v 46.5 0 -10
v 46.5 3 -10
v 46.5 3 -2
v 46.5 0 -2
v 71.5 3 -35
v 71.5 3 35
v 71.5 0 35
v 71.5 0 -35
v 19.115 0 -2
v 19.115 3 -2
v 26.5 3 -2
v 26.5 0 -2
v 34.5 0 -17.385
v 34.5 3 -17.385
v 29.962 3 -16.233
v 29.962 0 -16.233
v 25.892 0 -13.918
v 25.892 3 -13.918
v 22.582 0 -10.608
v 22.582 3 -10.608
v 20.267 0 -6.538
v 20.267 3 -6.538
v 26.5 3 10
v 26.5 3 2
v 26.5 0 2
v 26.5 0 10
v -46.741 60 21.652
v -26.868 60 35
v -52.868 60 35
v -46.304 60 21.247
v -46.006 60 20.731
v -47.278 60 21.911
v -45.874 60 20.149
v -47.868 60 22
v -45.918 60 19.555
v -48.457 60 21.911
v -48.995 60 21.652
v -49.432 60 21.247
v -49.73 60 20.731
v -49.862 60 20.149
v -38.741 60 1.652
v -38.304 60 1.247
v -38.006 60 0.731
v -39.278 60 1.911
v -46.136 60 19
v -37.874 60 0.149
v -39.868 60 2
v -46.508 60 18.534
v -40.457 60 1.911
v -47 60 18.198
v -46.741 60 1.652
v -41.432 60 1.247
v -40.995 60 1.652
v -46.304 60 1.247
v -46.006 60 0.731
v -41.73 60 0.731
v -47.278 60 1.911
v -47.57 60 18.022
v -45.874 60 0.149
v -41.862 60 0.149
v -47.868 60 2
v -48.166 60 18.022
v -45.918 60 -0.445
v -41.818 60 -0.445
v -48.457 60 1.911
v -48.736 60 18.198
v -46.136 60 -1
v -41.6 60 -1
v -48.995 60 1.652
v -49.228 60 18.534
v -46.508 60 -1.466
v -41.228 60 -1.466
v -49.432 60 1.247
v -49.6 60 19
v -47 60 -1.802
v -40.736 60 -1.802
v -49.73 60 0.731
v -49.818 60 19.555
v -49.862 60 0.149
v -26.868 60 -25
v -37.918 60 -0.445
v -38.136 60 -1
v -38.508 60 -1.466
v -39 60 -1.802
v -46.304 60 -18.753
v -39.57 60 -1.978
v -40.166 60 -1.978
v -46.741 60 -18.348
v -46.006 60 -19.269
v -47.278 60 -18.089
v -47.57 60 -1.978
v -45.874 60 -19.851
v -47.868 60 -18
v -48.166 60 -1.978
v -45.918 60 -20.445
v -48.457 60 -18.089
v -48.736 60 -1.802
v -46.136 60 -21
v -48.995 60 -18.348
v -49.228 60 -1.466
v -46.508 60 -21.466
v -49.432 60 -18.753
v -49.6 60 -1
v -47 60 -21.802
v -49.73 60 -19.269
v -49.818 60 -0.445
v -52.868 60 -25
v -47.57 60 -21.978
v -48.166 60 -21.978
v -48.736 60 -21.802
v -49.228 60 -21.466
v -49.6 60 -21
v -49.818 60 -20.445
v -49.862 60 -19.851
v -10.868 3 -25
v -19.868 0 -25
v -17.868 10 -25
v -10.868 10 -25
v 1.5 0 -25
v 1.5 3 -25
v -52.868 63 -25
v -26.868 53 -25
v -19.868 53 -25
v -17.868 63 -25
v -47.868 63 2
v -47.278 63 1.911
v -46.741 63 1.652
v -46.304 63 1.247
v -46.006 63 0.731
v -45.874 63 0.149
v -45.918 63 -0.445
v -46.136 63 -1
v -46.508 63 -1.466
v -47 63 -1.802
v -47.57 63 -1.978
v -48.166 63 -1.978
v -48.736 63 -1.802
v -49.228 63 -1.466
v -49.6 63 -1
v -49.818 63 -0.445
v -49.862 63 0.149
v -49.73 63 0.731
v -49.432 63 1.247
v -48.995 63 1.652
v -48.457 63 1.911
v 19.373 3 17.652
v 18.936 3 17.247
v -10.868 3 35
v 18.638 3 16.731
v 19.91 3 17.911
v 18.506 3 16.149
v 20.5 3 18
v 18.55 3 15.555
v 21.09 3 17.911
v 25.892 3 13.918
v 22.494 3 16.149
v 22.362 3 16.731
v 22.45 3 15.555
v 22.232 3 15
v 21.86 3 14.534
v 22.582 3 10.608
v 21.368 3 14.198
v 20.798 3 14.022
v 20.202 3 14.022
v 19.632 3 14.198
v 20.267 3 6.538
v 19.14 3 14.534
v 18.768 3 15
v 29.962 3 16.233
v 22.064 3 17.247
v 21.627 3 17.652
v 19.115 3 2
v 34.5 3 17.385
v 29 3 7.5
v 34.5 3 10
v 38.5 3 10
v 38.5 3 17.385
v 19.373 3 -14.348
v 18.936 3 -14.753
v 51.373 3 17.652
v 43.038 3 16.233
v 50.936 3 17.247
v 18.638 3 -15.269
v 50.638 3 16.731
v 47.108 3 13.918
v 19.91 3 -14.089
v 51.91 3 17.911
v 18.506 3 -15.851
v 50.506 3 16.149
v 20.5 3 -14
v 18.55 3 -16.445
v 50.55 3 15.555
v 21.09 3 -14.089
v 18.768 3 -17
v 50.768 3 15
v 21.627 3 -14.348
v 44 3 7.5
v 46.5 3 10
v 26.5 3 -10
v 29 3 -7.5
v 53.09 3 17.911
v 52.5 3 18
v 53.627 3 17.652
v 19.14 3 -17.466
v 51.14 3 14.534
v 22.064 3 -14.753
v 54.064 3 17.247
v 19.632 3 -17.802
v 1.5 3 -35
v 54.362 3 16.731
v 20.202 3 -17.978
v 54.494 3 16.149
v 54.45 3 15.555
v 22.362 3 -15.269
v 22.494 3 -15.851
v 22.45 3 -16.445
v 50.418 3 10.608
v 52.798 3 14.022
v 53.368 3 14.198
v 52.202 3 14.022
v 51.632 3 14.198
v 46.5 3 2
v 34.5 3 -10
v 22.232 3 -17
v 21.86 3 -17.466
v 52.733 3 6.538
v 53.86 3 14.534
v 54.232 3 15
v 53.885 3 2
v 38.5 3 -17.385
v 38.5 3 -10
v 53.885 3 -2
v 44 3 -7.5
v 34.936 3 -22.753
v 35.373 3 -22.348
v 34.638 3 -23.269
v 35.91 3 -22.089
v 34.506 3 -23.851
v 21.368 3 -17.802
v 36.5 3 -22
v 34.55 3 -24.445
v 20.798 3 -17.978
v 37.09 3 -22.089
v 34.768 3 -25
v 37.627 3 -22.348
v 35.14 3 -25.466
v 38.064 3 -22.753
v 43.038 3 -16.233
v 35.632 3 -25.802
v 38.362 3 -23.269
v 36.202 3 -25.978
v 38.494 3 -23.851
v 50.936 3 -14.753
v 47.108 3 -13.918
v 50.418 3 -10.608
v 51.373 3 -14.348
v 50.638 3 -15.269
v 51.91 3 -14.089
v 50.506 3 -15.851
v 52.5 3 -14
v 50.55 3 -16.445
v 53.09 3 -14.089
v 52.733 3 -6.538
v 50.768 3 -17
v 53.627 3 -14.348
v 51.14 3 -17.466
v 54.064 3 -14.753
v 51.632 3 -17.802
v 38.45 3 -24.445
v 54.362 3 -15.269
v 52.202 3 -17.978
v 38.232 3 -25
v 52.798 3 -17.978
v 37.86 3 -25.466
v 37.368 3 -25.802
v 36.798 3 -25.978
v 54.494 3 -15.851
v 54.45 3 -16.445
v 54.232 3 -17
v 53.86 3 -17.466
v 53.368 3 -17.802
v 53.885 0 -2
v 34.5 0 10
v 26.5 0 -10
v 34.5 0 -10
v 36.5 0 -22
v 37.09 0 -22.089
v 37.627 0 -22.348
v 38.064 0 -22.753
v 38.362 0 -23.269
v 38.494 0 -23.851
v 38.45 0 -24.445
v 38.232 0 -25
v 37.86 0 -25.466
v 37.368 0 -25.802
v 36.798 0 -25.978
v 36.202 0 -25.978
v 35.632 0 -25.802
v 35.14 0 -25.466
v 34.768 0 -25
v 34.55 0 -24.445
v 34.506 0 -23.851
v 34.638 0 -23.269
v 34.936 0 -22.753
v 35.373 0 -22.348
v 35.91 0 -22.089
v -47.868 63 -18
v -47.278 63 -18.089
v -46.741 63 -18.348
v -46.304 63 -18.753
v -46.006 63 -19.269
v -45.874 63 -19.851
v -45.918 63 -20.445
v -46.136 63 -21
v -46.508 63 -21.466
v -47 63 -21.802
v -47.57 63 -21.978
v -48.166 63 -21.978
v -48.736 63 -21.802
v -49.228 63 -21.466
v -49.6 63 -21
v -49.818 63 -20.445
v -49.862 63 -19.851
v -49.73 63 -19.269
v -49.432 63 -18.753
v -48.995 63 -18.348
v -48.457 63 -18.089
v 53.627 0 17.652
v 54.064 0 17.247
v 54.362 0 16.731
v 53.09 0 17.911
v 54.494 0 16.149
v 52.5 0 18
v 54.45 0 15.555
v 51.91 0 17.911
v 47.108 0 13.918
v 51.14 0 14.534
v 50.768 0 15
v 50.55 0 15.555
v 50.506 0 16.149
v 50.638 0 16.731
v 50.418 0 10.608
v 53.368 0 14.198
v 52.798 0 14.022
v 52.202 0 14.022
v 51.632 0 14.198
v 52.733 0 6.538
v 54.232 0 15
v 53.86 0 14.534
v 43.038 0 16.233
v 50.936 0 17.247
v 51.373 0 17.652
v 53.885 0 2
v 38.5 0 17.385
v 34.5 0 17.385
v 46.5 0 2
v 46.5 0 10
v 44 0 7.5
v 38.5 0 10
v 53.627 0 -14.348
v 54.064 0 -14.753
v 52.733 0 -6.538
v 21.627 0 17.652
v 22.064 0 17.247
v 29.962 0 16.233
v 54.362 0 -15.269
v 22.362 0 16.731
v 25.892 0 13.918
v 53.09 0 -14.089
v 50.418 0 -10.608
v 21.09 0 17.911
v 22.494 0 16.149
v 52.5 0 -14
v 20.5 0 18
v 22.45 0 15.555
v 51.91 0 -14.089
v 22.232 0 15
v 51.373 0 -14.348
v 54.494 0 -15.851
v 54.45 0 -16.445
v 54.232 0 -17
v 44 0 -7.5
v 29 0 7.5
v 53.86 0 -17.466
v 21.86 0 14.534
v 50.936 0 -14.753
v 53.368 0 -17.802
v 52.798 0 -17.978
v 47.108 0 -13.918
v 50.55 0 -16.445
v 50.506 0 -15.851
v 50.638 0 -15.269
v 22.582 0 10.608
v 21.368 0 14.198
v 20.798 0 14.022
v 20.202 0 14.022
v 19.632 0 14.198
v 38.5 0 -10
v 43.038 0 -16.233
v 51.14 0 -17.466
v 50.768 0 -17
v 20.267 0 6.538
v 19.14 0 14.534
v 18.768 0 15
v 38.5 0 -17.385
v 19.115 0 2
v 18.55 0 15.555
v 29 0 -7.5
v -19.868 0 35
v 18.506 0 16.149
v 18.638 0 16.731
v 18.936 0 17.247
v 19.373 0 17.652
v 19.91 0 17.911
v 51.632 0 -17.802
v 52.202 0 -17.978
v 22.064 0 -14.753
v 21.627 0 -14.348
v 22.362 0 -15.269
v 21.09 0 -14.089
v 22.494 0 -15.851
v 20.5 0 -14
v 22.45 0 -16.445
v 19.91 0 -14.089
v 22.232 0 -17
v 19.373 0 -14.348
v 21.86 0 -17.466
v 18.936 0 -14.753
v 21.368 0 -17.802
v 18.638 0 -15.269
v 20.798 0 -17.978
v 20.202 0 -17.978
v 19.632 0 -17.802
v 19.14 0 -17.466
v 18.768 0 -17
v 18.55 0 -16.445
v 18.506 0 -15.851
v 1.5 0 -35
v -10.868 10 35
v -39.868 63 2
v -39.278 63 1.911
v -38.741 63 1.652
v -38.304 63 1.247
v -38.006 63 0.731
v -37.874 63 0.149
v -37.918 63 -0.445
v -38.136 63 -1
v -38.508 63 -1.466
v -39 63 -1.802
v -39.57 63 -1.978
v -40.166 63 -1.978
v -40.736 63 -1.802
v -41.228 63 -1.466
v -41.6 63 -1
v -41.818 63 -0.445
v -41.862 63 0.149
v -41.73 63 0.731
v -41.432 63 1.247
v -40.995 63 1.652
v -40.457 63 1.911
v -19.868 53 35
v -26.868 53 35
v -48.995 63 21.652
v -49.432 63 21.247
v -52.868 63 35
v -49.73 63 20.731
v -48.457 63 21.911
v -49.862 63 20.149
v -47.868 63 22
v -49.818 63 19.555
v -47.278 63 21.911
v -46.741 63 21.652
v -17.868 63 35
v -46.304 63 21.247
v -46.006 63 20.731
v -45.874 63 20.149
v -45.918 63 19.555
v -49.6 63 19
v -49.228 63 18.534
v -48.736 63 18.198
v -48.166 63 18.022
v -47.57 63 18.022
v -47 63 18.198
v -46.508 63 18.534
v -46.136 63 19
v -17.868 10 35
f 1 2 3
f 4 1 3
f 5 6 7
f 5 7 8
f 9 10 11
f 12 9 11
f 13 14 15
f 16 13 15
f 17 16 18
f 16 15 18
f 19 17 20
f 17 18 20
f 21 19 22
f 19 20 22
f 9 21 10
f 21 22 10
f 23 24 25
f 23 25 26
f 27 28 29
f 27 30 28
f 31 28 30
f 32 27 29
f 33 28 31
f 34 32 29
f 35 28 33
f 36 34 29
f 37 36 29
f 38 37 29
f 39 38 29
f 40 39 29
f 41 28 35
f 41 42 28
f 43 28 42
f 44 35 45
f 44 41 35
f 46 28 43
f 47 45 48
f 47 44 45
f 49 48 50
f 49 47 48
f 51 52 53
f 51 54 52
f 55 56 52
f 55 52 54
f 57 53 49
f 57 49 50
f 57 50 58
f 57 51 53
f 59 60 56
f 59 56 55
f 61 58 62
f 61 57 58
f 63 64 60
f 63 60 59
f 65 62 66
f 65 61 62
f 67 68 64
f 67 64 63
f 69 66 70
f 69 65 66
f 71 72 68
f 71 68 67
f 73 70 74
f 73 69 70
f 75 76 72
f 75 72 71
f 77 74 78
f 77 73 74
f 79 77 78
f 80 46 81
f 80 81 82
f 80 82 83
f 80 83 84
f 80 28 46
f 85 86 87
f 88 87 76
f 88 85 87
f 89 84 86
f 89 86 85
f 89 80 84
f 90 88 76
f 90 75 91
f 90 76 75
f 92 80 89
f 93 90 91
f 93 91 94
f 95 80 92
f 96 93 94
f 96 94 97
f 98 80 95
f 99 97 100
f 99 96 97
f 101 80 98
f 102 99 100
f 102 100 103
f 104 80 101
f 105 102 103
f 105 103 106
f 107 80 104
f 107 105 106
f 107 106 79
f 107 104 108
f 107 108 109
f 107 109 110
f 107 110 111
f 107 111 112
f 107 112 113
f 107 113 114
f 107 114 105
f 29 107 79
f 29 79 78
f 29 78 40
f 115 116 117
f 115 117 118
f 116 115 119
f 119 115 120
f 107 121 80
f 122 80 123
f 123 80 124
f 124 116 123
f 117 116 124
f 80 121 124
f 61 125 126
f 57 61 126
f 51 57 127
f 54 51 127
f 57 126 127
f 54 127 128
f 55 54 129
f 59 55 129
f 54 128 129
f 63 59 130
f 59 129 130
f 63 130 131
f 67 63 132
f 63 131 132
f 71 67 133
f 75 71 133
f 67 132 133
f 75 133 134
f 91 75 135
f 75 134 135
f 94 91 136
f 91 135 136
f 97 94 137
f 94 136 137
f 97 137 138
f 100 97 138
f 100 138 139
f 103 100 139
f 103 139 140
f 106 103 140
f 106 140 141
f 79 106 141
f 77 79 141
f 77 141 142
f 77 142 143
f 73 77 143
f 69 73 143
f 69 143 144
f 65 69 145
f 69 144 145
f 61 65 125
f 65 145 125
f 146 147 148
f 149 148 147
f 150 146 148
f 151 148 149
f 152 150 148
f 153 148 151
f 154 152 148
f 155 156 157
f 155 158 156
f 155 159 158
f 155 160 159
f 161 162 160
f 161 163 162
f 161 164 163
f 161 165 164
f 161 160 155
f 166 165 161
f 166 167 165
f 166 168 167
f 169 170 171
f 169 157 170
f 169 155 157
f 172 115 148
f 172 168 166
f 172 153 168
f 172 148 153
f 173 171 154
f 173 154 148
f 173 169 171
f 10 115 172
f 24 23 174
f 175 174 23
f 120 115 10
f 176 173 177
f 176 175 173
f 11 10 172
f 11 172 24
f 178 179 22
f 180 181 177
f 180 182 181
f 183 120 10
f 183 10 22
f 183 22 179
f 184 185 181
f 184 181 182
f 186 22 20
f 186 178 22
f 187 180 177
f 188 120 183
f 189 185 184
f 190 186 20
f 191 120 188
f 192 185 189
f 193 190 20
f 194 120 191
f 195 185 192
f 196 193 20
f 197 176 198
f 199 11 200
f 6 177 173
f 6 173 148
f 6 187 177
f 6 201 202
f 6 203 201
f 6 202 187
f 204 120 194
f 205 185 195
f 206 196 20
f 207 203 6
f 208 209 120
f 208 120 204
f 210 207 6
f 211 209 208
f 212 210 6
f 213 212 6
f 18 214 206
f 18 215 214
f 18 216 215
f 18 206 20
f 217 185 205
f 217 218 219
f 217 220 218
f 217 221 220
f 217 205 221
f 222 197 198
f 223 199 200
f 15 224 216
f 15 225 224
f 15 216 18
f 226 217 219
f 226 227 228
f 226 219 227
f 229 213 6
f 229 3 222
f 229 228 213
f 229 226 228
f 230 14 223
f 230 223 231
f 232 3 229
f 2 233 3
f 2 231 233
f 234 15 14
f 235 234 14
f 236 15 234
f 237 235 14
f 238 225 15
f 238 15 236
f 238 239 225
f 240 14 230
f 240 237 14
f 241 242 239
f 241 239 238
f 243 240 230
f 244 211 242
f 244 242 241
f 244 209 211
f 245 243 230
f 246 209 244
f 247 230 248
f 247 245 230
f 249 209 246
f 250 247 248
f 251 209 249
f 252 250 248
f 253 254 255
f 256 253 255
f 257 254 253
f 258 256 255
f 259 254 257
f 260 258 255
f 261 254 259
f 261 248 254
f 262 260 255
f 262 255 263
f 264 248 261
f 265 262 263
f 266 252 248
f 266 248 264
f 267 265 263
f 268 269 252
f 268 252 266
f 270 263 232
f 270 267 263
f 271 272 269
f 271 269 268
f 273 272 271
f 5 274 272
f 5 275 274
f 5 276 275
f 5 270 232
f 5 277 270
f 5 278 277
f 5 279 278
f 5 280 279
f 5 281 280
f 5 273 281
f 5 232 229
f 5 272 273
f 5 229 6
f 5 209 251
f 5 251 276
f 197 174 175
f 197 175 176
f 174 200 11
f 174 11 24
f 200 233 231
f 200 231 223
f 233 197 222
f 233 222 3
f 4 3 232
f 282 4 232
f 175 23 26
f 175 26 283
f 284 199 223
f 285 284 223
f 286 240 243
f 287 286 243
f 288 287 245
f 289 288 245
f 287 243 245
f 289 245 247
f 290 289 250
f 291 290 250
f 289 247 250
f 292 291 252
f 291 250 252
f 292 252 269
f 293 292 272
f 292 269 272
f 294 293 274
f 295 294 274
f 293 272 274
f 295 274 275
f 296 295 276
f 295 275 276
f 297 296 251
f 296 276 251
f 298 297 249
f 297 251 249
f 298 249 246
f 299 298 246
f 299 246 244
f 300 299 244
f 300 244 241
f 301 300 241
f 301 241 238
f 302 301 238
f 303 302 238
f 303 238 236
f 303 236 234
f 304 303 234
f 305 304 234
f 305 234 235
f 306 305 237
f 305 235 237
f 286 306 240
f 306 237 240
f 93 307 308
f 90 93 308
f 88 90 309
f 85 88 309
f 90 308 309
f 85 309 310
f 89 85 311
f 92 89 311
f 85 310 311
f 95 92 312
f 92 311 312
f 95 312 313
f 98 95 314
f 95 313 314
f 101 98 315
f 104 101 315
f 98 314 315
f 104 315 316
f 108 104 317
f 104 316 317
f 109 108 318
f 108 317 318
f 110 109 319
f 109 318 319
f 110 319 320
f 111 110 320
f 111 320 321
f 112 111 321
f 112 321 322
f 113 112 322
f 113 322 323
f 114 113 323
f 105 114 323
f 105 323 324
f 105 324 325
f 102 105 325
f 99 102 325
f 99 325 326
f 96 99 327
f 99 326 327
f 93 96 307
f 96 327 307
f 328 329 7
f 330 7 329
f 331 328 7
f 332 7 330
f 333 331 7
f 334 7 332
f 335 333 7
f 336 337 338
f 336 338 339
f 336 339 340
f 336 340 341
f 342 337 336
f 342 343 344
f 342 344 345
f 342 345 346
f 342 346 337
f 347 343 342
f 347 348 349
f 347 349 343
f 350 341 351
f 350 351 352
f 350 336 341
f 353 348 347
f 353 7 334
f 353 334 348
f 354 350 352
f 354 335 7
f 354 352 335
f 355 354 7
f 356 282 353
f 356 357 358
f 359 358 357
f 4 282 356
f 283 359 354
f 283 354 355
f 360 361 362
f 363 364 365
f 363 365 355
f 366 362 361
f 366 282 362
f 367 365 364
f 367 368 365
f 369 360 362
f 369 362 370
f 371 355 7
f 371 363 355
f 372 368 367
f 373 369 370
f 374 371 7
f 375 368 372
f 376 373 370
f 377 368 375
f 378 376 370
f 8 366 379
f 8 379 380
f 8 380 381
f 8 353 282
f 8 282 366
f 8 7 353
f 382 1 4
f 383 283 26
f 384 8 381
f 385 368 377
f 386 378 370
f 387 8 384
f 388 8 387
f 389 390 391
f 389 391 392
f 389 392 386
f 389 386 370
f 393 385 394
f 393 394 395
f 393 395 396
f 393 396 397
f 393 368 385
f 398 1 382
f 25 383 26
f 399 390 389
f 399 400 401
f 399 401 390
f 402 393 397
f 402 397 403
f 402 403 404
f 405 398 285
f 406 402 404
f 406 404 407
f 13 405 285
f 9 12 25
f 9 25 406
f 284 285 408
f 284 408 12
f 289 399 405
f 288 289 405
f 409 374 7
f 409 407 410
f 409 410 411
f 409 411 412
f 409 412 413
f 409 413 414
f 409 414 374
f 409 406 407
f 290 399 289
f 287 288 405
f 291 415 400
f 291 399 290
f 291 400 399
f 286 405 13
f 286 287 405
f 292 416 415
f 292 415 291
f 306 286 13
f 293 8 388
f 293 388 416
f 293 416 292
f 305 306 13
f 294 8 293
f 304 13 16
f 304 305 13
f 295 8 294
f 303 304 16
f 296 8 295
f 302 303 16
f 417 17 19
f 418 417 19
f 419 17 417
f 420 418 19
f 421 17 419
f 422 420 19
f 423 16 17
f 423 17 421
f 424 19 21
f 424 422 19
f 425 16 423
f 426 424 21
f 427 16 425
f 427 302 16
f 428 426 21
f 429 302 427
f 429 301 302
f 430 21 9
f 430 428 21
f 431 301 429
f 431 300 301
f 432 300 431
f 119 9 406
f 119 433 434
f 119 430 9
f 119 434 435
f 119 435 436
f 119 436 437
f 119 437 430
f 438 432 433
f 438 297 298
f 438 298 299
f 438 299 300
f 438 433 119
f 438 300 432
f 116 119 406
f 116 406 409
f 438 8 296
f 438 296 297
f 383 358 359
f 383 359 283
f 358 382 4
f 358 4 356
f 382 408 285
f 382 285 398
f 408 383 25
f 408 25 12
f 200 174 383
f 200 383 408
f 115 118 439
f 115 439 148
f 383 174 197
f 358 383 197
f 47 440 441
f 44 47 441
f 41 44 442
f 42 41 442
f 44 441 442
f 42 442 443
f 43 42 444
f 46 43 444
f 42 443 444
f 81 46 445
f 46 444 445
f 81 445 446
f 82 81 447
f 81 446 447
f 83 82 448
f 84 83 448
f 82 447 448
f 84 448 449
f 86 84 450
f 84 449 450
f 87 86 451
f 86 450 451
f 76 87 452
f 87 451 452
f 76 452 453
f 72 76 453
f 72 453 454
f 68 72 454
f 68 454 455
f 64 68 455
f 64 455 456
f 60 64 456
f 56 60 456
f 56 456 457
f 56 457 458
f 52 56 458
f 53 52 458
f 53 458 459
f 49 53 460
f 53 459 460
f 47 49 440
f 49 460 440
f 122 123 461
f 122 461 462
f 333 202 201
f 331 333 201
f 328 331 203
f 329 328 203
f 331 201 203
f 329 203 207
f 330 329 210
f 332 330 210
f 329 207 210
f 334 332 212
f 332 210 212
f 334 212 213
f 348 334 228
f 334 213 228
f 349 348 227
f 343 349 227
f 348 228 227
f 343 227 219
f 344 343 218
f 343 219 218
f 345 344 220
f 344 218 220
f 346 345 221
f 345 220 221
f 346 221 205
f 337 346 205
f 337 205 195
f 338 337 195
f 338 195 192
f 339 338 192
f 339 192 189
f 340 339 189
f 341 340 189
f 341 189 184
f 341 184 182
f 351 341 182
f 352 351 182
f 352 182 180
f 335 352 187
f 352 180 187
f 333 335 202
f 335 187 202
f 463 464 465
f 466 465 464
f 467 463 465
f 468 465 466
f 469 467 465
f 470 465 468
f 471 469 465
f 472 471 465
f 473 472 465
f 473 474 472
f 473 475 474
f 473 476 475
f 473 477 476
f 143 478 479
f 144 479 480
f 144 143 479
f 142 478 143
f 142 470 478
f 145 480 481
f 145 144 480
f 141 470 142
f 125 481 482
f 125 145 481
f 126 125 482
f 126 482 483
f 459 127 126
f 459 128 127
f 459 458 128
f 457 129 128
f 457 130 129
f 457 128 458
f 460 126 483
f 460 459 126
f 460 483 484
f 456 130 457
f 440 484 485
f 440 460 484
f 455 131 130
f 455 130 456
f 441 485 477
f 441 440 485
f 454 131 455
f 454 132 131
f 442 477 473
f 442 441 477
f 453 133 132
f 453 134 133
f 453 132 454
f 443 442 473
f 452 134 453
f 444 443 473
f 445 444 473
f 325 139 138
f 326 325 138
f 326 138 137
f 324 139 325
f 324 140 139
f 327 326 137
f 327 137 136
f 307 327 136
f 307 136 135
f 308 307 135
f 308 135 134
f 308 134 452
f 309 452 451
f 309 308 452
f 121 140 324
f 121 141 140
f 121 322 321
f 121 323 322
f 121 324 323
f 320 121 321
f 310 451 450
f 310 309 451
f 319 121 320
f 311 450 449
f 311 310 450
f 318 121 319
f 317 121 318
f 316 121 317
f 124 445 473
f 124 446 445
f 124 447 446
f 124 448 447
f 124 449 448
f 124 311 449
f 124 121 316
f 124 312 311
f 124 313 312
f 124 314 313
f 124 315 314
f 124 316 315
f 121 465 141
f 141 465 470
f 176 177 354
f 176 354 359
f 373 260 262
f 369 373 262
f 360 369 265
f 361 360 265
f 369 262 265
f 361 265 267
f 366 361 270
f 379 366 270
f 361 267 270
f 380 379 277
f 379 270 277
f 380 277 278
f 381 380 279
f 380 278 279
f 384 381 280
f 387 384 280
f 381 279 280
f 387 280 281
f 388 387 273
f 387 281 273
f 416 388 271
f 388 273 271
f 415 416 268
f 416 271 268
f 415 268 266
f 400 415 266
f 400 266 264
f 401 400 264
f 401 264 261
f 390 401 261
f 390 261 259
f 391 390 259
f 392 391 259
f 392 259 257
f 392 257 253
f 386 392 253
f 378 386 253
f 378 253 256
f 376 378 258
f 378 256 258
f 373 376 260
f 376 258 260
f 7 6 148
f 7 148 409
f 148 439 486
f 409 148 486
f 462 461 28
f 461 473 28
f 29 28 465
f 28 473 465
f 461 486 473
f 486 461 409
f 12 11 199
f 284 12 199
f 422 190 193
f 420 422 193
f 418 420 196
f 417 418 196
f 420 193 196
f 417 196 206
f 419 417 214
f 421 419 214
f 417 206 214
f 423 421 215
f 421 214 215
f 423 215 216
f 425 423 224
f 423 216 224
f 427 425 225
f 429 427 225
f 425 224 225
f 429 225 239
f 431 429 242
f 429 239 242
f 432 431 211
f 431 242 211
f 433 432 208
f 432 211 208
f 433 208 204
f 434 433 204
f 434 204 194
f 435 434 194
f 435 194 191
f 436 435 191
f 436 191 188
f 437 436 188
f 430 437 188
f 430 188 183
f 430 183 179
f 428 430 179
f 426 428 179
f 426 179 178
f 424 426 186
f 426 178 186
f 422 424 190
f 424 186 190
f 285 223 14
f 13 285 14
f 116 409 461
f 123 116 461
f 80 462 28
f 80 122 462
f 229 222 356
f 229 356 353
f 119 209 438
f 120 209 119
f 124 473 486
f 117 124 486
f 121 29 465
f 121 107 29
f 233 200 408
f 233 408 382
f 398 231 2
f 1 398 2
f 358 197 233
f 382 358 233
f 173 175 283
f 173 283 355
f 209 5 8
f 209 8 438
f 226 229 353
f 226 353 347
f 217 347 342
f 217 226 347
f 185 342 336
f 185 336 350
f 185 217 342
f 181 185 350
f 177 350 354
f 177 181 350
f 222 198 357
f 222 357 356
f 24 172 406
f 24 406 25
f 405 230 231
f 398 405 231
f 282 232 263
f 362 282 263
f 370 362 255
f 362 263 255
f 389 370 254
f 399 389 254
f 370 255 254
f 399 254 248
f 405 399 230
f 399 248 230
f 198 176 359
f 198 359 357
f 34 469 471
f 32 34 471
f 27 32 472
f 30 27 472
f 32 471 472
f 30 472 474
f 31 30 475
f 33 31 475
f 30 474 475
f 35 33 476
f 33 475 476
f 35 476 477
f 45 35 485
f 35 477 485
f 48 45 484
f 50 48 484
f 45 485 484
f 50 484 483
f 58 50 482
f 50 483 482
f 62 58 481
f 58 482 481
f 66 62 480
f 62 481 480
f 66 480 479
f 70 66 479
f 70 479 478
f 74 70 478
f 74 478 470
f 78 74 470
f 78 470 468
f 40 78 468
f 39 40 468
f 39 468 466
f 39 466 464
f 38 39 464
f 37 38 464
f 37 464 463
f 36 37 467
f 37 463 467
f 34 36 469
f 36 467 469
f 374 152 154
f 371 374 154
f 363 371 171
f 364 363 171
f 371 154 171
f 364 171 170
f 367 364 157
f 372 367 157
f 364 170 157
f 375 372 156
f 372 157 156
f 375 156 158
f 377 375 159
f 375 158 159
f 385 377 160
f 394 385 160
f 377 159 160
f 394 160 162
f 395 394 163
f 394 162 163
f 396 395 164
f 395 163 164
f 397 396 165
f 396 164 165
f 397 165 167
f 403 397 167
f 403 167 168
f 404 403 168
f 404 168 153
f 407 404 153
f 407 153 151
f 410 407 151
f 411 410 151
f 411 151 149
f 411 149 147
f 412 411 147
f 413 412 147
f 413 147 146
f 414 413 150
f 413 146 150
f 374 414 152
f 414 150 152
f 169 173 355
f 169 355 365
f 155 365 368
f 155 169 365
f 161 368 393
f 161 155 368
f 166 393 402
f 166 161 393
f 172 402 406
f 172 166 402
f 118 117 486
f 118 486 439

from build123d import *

# Parameters (mm, degrees)
IZIM1_W                     = 75
IZIM1_H                     = 50
Y_KSEKLIK_EKSTR_ZYON1_DEPTH = 3
IZIM8_W                     = 19.632022489
IZIM8_H                     = 50
KES_EKSTR_ZYON4_DEPTH       = 3
IZIM9_W                     = 2
IZIM9_H                     = 50
Y_KSEKLIK_EKSTR_ZYON2_DEPTH = 60
IZIM10_W                    = 35
IZIM10_H                    = 50
Y_KSEKLIK_EKSTR_ZYON3_DEPTH = 3
IZIM12_R                    = 2
KES_EKSTR_ZYON5_DEPTH       = 3
IZIM13_W                    = 20
IZIM13_H                    = 50
Y_KSEKLIK_EKSTR_ZYON4_DEPTH = 3
IZIM14_R                    = 2
KES_EKSTR_ZYON6_DEPTH       = 3
IZIM15_W                    = 15
IZIM15_H                    = 15
KES_EKSTR_ZYON7_DEPTH       = 3
KES_EKSTR_ZYON8_DEPTH       = 3
IZIM17_W                    = 5
IZIM17_H                    = 50
Y_KSEKLIK_EKSTR_ZYON5_DEPTH = 3
Y_KSEKLIK_EKSTR_ZYON6_DEPTH = 3
IZIM19_R                    = 2
KES_EKSTR_ZYON9_DEPTH       = 3
IZIM20_W                    = 7
IZIM20_H                    = 7
Y_KSEKLIK_EKSTR_ZYON7_DEPTH = 50
Y_KSEKLIK_EKSTR_ZYON8_DEPTH = 10


with BuildPart() as part:
    # Çizim1 → Yükseklik-Ekstrüzyon1 (new body)
    with BuildSketch(Plane(origin=(0, 0, 0), x_dir=(1, 0, 0), z_dir=(0, 1, 0))):
        Rectangle(IZIM1_W, IZIM1_H)
    extrude(amount=Y_KSEKLIK_EKSTR_ZYON1_DEPTH)

    # Çizim8 → Kes-Ekstrüzyon4 (cut)
    with BuildSketch(Plane(origin=(0, 3, 0), x_dir=(1, 0, 0), z_dir=(0, 1, 0))):
        with Locations((-27.683988755, 0)):
            Rectangle(IZIM8_W, IZIM8_H)
    extrude(amount=-KES_EKSTR_ZYON4_DEPTH, mode=Mode.SUBTRACT)

    # Çizim9 → Yükseklik-Ekstrüzyon2 (add)
    with BuildSketch(Plane(origin=(0, 0, 0), x_dir=(1, 0, 0), z_dir=(0, 1, 0))):
        with Locations((-18.867977511, 0)):
            Rectangle(IZIM9_W, IZIM9_H)
    extrude(amount=Y_KSEKLIK_EKSTR_ZYON2_DEPTH)

    # Çizim10 → Yükseklik-Ekstrüzyon3 (add)
    with BuildSketch(Plane(origin=(0, 60, 0), x_dir=(1, 0, 0), z_dir=(0, 1, 0))):
        with Locations((-35.367977511, 0)):
            Rectangle(IZIM10_W, IZIM10_H)
    extrude(amount=Y_KSEKLIK_EKSTR_ZYON3_DEPTH)

    # Çizim12 → Kes-Ekstrüzyon5 (cut)
    with BuildSketch(Plane(origin=(0, 63, 0), x_dir=(1, 0, 0), z_dir=(0, 1, 0))):
        with Locations(Location((-39.867977511, 0, 0), (0, 0, 270))):
            Circle(IZIM12_R)
        with Locations(Location((-47.867977511, 0, 0), (0, 0, 270))):
            Circle(IZIM12_R)
        with Locations(Location((-47.867977511, 20, 0), (0, 0, 270))):
            Circle(IZIM12_R)
        with Locations(Location((-47.867977511, -20, 0), (0, 0, 270))):
            Circle(IZIM12_R)
    extrude(amount=-KES_EKSTR_ZYON5_DEPTH, mode=Mode.SUBTRACT)

    # Çizim13 → Yükseklik-Ekstrüzyon4 (add)
    with BuildSketch(Plane(origin=(0, 3, 0), x_dir=(1, 0, 0), z_dir=(0, 1, 0))):
        with Locations((47.5, 0)):
            Rectangle(IZIM13_W, IZIM13_H)
    extrude(amount=-Y_KSEKLIK_EKSTR_ZYON4_DEPTH)

    # Çizim14 → Kes-Ekstrüzyon6 (cut)
    with BuildSketch(Plane(origin=(0, 3, 0), x_dir=(1, 0, 0), z_dir=(0, 1, 0))):
        with Locations(Location((20.5, 16, 0), (0, 0, 270))):
            Circle(IZIM14_R)
        with Locations(Location((52.5, 16, 0), (0, 0, 270))):
            Circle(IZIM14_R)
        with Locations(Location((20.5, -16, 0), (0, 0, 270))):
            Circle(IZIM14_R)
        with Locations(Location((52.5, -16, 0), (0, 0, 270))):
            Circle(IZIM14_R)
    extrude(amount=-KES_EKSTR_ZYON6_DEPTH, mode=Mode.SUBTRACT)

    # Çizim15 → Kes-Ekstrüzyon7 (cut)
    with BuildSketch(Plane(origin=(0, 3, 0), x_dir=(1, 0, 0), z_dir=(0, 1, 0))):
        with Locations((36.5, 0)):
            Rectangle(IZIM15_W, IZIM15_H)
    extrude(amount=-KES_EKSTR_ZYON7_DEPTH, mode=Mode.SUBTRACT)

    # Çizim16 → Kes-Ekstrüzyon8 (cut)
    with BuildSketch(Plane(origin=(0, 3, 0), x_dir=(1, 0, 0), z_dir=(0, 1, 0))):
        with BuildLine():
            Line((46.5, 2), (53.885338651, 2))
            ThreePointArc((53.885338651, 2), (48.874368671, 12.374368671), (38.5, 17.385338651))
            Line((38.5, 17.385338651), (38.5, 10))
            Line((38.5, 10), (46.5, 10))
            Line((46.5, 10), (46.5, 2))
        make_face()
        with BuildLine():
            Line((26.5, 10), (34.5, 10))
            Line((34.5, 10), (34.5, 17.385338651))
            ThreePointArc((34.5, 17.385338651), (24.125631329, 12.374368671), (19.114661349, 2))
            Line((19.114661349, 2), (26.5, 2))
            Line((26.5, 2), (26.5, 10))
        make_face()
        with BuildLine():
            Line((26.5, -10), (34.5, -10))
            Line((34.5, -10), (34.5, -17.385338651))
            ThreePointArc((34.5, -17.385338651), (24.125631329, -12.374368671), (19.114661349, -2))
            Line((19.114661349, -2), (26.5, -2))
            Line((26.5, -2), (26.5, -10))
        make_face()
        with BuildLine():
            Line((46.5, -2), (53.885338651, -2))
            ThreePointArc((53.885338651, -2), (48.874368671, -12.374368671), (38.5, -17.385338651))
            Line((38.5, -17.385338651), (38.5, -10))
            Line((38.5, -10), (46.5, -10))
            Line((46.5, -10), (46.5, -2))
        make_face()
    extrude(amount=-KES_EKSTR_ZYON8_DEPTH, mode=Mode.SUBTRACT)

    # Çizim17 → Yükseklik-Ekstrüzyon5 (add)
    with BuildSketch(Plane(origin=(0, 3, 0), x_dir=(1, 0, 0), z_dir=(0, 1, 0))):
        with Locations((60, 0)):
            Rectangle(IZIM17_W, IZIM17_H)
    extrude(amount=-Y_KSEKLIK_EKSTR_ZYON5_DEPTH)

    # Çizim18 → Yükseklik-Ekstrüzyon6 (add)
    with BuildSketch(Plane(origin=(0, 3, 0), x_dir=(1, 0, 0), z_dir=(0, 1, 0))):
        Polygon((1.5, 25), (62.5, 25), (62.5, -25), (1.5, -25), (1.5, -35), (71.5, -35), (71.5, 35), (1.5, 35), align=None)
    extrude(amount=-Y_KSEKLIK_EKSTR_ZYON6_DEPTH)

    # Çizim19 → Kes-Ekstrüzyon9 (cut)
    with BuildSketch(Plane(origin=(0, 3, 0), x_dir=(1, 0, 0), z_dir=(0, 1, 0))):
        with Locations(Location((36.5, 24, 0), (0, 0, 270))):
            Circle(IZIM19_R)
    extrude(amount=-KES_EKSTR_ZYON9_DEPTH, mode=Mode.SUBTRACT)

    # Çizim20 → Yükseklik-Ekstrüzyon7 (add)
    with BuildSketch(Plane.XY.offset(25)):
        with Locations((-23.367977511, 56.5)):
            Rectangle(IZIM20_W, IZIM20_H)
        with Locations((-14.367977511, 6.5)):
            Rectangle(IZIM20_W, IZIM20_H)
    extrude(amount=-Y_KSEKLIK_EKSTR_ZYON7_DEPTH)

    # Çizim21 → Yükseklik-Ekstrüzyon8 (add)
    with BuildSketch(Plane.XY.offset(25)):
        Polygon((-52.867977511, 60), (-52.867977511, 63), (-17.867977511, 63), (-17.867977511, 10), (-10.867977511, 10), (-10.867977511, 3), (1.5, 3), (1.5, 0), (-19.867977511, 0), (-19.867977511, 53), (-26.867977511, 53), (-26.867977511, 60), align=None)
    extrude(amount=Y_KSEKLIK_EKSTR_ZYON8_DEPTH)


solid = part.part
